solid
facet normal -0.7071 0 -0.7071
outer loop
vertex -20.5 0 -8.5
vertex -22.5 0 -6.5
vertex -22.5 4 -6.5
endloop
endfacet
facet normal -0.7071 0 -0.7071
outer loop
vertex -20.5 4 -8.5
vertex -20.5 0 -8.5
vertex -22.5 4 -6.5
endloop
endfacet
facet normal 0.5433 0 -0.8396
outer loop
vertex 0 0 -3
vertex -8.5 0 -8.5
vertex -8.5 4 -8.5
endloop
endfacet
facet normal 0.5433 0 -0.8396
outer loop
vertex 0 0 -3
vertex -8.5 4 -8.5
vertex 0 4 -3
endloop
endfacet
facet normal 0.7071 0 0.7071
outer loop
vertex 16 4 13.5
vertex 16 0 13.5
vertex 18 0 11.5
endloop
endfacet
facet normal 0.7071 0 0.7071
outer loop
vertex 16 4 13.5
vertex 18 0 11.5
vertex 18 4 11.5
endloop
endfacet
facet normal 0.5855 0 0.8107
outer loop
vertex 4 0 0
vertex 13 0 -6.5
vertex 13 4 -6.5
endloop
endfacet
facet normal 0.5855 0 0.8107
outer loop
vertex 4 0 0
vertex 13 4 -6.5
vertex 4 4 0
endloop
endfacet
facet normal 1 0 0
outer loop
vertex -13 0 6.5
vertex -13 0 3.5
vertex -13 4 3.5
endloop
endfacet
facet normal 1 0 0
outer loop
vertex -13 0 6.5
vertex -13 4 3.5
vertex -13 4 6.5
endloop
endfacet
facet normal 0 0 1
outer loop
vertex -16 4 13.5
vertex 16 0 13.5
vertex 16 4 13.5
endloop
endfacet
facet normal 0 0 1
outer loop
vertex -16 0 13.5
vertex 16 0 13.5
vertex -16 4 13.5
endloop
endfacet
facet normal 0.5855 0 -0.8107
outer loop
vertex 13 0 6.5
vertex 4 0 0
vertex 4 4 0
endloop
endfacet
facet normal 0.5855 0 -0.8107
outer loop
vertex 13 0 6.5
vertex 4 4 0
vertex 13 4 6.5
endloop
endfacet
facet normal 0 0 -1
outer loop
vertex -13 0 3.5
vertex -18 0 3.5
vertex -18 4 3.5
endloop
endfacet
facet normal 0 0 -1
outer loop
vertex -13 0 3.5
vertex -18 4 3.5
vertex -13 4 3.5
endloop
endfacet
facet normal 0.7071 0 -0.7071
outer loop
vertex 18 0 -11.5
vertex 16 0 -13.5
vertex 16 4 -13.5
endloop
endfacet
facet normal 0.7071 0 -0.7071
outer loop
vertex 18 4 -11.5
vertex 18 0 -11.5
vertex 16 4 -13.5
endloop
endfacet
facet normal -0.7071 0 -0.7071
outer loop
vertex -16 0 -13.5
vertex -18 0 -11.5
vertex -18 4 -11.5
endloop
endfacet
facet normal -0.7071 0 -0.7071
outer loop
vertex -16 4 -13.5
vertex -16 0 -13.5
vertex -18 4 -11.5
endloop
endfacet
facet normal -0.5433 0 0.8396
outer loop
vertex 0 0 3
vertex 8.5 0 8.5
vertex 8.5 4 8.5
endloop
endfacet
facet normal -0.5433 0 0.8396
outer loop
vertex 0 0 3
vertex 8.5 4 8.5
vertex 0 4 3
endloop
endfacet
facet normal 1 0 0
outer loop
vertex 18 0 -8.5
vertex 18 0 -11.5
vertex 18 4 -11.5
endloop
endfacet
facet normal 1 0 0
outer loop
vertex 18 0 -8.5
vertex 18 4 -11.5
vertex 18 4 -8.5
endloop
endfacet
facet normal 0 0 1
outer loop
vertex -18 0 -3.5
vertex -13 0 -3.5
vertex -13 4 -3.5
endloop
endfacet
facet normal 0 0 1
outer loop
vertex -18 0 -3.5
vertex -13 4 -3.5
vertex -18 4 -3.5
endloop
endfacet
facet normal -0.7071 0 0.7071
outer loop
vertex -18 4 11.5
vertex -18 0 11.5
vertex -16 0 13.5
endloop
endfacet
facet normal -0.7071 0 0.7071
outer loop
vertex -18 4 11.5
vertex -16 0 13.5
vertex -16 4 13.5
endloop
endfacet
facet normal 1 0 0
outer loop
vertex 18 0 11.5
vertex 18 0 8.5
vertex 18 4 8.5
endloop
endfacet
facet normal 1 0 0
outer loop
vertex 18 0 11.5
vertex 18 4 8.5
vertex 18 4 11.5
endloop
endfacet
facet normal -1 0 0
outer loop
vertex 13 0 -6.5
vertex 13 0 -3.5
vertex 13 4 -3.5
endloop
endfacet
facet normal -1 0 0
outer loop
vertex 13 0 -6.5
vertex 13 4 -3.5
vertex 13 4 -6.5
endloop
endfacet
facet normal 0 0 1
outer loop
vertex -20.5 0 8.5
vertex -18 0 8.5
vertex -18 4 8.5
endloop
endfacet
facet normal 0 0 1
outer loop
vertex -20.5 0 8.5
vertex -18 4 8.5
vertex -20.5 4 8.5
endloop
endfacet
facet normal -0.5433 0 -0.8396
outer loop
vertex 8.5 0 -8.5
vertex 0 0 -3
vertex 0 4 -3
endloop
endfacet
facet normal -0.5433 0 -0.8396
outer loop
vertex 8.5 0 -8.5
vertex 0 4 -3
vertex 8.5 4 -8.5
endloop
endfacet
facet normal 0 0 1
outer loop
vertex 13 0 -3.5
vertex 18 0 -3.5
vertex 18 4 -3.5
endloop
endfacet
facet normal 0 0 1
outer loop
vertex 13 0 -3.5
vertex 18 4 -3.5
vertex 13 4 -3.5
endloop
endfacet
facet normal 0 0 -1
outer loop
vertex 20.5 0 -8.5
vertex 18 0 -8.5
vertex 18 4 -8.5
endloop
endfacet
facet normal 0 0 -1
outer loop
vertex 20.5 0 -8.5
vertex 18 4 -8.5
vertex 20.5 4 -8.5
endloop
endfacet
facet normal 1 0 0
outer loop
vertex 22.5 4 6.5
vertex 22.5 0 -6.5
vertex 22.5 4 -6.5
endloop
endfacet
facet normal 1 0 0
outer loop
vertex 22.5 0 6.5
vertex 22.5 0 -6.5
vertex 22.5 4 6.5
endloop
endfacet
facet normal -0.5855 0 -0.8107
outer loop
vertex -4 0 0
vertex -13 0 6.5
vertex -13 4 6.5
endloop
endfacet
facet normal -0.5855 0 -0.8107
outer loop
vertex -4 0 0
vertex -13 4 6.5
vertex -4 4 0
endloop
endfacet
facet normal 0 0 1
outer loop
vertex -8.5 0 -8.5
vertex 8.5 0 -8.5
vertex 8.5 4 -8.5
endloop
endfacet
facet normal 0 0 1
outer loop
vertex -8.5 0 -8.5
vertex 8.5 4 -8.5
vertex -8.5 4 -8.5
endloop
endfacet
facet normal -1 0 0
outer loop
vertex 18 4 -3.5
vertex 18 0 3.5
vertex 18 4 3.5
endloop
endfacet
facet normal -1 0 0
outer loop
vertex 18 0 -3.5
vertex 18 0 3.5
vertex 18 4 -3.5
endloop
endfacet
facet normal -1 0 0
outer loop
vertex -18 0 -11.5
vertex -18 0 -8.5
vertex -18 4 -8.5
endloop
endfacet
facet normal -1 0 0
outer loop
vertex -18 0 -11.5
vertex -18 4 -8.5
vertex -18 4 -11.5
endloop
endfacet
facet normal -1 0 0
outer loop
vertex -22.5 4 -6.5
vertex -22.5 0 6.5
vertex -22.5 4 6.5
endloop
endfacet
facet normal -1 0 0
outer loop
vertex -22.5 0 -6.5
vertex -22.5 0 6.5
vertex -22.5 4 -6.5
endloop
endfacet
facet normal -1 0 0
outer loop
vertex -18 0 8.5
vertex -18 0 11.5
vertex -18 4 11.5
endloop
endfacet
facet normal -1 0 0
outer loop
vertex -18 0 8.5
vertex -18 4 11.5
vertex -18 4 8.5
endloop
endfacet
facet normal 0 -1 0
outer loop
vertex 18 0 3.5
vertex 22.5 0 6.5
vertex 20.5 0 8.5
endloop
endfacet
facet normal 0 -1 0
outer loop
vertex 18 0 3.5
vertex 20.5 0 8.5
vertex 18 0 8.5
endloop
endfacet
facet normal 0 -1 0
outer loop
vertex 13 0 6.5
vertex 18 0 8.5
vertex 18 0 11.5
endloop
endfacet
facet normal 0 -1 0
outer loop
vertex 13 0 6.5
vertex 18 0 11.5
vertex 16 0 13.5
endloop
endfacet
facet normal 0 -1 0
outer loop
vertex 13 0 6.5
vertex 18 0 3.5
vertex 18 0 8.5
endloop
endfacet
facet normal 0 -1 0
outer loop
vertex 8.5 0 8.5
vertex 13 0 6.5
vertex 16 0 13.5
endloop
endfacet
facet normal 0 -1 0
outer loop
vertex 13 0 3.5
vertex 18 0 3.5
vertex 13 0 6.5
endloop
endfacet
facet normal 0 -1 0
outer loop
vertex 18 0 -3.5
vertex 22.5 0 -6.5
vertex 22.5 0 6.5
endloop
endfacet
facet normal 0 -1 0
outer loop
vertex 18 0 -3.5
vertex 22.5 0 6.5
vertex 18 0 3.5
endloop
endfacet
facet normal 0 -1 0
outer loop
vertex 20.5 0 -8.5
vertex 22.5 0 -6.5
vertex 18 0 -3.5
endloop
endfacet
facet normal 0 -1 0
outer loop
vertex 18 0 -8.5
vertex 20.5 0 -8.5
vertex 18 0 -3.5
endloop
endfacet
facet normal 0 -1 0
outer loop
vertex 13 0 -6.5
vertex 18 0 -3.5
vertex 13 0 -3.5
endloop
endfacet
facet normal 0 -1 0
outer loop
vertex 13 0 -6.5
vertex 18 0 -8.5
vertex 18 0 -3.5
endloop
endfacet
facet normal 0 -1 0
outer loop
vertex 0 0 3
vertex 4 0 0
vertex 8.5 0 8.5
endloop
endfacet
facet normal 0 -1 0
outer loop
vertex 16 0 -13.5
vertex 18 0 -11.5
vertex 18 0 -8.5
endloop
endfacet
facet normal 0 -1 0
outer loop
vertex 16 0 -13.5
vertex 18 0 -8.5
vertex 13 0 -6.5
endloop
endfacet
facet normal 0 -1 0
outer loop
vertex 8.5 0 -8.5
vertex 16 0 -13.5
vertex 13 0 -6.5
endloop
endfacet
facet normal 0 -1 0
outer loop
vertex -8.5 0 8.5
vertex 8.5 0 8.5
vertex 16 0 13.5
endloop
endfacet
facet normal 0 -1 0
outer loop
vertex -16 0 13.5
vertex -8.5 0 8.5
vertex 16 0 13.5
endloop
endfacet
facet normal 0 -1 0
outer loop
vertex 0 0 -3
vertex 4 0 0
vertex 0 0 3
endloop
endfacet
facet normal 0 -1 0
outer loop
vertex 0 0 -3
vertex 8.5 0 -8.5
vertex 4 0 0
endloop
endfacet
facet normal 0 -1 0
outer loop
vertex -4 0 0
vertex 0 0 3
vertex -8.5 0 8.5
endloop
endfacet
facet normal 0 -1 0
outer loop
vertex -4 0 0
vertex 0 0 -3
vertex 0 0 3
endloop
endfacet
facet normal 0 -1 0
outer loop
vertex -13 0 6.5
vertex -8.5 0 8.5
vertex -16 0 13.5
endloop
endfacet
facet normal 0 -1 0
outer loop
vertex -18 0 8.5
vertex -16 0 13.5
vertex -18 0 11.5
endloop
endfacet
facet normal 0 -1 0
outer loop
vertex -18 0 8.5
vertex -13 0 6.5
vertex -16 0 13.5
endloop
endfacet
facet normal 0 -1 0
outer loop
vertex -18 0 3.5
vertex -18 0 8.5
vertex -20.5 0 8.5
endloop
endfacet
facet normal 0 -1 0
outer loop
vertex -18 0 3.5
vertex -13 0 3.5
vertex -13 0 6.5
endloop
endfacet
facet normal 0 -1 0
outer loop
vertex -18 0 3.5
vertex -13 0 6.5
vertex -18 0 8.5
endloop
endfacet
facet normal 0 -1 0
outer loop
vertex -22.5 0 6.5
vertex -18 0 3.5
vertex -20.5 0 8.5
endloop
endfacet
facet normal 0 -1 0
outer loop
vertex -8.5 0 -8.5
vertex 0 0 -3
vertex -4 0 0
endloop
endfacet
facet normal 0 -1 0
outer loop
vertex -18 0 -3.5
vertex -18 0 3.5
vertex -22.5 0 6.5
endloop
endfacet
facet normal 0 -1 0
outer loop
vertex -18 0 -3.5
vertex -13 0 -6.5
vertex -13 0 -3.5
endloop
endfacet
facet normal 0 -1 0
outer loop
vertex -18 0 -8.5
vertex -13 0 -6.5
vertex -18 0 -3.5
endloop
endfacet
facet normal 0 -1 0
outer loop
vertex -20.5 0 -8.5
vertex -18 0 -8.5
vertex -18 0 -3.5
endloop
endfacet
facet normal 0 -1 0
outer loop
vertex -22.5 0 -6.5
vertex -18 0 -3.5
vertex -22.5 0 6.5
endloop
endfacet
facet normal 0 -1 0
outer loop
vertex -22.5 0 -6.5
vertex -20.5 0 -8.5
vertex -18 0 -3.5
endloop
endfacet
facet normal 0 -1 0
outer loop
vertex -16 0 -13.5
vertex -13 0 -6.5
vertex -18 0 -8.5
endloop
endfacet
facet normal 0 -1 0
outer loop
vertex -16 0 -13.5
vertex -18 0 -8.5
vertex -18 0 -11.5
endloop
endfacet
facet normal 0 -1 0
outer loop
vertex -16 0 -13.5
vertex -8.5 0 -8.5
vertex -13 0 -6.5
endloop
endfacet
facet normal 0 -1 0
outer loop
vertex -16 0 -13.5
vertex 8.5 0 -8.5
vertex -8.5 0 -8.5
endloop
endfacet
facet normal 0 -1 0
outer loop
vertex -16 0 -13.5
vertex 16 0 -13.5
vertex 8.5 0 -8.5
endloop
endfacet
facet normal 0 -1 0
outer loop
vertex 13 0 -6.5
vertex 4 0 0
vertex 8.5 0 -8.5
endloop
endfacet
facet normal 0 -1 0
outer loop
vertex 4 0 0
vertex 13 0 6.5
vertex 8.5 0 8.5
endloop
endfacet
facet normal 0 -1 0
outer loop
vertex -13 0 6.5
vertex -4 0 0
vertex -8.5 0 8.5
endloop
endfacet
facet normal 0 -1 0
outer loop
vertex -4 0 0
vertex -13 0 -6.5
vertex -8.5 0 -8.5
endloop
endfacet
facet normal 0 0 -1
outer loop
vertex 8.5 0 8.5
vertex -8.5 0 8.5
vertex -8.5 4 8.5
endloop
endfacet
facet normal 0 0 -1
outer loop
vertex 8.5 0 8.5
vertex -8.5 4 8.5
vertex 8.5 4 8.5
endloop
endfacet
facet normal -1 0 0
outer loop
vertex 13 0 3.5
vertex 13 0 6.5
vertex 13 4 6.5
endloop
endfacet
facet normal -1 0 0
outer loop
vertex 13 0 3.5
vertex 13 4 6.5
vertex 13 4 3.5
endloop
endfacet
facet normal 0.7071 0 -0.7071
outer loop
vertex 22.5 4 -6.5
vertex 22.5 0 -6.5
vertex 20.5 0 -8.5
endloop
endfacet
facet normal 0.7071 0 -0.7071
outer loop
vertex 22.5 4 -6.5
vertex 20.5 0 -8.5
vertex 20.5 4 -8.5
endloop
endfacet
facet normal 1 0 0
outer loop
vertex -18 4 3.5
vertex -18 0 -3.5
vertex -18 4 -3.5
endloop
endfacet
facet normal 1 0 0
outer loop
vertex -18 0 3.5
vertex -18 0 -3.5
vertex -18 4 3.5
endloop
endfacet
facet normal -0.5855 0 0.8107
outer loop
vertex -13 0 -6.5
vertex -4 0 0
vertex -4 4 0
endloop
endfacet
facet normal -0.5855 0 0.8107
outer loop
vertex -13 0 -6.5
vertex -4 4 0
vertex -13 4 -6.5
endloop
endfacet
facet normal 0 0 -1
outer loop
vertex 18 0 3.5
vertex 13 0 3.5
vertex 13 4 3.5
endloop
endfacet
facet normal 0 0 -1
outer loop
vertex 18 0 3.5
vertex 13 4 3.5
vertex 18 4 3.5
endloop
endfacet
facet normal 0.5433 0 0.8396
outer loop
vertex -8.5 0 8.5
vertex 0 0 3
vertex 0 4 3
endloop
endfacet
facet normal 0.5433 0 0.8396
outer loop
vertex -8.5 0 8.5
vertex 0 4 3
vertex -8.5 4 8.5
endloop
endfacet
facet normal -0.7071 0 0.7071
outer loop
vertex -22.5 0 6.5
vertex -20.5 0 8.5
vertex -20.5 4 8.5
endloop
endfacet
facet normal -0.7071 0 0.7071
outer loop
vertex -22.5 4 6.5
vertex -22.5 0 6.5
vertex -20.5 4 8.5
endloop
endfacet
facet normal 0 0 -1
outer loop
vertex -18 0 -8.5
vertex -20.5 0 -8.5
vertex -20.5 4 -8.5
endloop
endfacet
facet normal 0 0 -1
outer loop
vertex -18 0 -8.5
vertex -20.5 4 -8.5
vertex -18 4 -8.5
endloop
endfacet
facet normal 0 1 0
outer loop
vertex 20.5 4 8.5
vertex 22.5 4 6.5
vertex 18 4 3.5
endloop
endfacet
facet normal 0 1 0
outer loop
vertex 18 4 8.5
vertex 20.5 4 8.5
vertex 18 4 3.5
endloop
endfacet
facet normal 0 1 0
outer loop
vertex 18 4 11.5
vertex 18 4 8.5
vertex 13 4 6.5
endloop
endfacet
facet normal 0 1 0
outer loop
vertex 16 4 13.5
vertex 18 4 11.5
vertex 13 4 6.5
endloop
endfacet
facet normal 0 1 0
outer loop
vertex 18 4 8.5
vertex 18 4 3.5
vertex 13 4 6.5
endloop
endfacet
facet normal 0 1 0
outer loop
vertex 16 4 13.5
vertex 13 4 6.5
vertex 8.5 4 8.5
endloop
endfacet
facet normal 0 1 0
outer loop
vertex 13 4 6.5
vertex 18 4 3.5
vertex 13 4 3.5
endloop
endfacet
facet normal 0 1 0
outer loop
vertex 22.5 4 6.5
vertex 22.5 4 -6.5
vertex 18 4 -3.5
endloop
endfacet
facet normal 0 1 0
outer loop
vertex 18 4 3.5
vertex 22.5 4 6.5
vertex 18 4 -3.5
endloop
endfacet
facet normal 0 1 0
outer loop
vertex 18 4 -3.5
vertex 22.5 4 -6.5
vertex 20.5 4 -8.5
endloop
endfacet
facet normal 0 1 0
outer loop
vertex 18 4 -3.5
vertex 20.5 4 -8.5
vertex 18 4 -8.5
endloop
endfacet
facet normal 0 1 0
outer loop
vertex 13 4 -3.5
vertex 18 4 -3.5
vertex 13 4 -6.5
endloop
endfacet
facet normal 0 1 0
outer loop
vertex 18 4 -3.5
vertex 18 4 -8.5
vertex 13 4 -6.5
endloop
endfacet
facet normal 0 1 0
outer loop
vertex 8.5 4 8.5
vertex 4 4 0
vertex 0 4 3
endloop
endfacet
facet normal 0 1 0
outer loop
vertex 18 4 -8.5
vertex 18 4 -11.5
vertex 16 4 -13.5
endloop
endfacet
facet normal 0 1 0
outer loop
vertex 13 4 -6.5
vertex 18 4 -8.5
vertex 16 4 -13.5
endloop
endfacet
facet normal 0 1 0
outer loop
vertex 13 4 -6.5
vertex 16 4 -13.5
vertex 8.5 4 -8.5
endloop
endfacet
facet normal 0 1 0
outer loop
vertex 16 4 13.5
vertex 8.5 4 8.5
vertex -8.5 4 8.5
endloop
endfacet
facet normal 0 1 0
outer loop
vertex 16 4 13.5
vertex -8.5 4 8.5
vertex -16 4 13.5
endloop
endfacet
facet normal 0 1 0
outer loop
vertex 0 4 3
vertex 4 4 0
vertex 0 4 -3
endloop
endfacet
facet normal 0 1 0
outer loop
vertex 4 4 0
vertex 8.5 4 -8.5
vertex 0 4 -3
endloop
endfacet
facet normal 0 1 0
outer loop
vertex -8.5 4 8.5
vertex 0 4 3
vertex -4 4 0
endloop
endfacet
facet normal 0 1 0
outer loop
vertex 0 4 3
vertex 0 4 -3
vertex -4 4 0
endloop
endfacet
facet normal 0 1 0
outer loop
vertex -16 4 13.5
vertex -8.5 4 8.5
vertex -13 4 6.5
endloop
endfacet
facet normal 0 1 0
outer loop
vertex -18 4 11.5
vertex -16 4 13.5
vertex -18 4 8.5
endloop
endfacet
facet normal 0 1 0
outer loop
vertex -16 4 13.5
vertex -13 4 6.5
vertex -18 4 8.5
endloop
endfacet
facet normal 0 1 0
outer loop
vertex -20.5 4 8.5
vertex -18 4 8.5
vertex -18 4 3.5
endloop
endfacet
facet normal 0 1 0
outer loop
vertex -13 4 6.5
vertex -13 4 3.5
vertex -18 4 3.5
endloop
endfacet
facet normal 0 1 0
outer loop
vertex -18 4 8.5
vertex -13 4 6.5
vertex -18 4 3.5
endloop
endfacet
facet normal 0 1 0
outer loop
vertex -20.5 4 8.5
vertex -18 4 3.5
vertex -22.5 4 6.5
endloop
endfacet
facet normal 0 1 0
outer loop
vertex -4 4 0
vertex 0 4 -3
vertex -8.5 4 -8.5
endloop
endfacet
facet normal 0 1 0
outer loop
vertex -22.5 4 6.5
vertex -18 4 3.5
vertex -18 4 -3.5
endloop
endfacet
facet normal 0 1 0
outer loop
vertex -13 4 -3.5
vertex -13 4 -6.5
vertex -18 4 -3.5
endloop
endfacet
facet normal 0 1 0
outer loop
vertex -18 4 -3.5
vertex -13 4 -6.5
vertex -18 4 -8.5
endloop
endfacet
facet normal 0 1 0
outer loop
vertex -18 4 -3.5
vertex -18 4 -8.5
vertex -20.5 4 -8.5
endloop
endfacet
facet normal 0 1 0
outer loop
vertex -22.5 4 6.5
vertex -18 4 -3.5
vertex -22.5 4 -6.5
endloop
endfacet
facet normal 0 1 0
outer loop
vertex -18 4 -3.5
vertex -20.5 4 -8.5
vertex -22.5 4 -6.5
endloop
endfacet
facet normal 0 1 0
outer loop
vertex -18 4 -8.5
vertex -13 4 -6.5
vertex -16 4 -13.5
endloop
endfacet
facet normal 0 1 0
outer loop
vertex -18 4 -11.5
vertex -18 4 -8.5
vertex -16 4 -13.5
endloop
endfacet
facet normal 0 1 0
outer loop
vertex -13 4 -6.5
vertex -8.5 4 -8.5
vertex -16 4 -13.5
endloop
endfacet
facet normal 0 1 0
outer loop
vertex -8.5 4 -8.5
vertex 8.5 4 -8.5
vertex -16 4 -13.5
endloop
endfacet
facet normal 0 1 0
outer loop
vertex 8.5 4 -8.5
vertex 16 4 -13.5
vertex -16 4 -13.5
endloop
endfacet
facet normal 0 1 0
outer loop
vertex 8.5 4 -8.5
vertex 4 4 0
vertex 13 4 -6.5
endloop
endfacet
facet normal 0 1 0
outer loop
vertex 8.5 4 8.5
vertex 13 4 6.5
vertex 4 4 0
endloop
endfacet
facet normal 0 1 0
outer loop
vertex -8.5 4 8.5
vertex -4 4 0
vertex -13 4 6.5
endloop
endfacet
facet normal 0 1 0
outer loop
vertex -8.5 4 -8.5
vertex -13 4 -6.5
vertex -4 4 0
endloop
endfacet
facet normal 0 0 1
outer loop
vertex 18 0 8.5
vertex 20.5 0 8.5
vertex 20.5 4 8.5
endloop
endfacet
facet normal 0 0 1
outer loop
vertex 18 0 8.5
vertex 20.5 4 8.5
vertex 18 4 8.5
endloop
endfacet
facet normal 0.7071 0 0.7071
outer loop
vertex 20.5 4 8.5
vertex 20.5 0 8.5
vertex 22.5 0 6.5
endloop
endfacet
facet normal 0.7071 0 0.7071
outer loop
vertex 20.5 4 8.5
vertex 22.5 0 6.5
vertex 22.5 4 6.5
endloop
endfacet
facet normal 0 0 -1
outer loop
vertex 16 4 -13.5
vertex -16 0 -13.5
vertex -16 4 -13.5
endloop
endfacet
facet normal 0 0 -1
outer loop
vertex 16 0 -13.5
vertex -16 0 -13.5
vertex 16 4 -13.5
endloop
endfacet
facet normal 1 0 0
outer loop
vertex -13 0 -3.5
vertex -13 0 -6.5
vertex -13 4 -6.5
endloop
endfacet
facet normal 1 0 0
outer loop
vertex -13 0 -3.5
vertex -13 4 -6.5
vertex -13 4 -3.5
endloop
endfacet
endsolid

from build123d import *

# Parameters (mm, degrees)
BOSS_EXTRUDE1_DEPTH = 4
CHAMFER1_SIZE       = 2


with BuildPart() as part:
    # Sketch2 → Boss-Extrude1 (new body)
    with BuildSketch(Plane(origin=(0, 0, 0), x_dir=(1, 0, 0), z_dir=(0, 1, 0))):
        Polygon((18, 8.5), (22.5, 8.5), (22.5, -8.5), (18, -8.5), (18, -13.5), (-18, -13.5), (-18, -8.5), (-22.5, -8.5), (-22.5, 8.5), (-18, 8.5), (-18, 13.5), (18, 13.5), align=None)
        Polygon((-8.5, -8.5), (8.5, -8.5), (0, -3), align=None, mode=Mode.SUBTRACT)
        Polygon((-4, 0), (-13, 6.5), (-13, 3.5), (-18, 3.5), (-18, -3.5), (-13, -3.5), (-13, -6.5), align=None, mode=Mode.SUBTRACT)
        Polygon((-8.5, 8.5), (0, 3), (8.5, 8.5), align=None, mode=Mode.SUBTRACT)
        Polygon((4, 0), (13, -6.5), (13, -3.5), (18, -3.5), (18, 3.5), (13, 3.5), (13, 6.5), align=None, mode=Mode.SUBTRACT)
    extrude(amount=BOSS_EXTRUDE1_DEPTH)

    # Chamfer1
    chamfer1_edges = [part.edges().sort_by_distance(p)[0] for p in [
        (22.5, 2, -8.5),
        (22.5, 2, 8.5),
        (18, 2, 13.5),
        (-18, 2, 13.5),
        (-22.5, 2, 8.5),
        (-22.5, 2, -8.5),
        (-18, 2, -13.5),
        (18, 2, -13.5),
    ]]
    chamfer(chamfer1_edges, length=CHAMFER1_SIZE)


solid = part.part
